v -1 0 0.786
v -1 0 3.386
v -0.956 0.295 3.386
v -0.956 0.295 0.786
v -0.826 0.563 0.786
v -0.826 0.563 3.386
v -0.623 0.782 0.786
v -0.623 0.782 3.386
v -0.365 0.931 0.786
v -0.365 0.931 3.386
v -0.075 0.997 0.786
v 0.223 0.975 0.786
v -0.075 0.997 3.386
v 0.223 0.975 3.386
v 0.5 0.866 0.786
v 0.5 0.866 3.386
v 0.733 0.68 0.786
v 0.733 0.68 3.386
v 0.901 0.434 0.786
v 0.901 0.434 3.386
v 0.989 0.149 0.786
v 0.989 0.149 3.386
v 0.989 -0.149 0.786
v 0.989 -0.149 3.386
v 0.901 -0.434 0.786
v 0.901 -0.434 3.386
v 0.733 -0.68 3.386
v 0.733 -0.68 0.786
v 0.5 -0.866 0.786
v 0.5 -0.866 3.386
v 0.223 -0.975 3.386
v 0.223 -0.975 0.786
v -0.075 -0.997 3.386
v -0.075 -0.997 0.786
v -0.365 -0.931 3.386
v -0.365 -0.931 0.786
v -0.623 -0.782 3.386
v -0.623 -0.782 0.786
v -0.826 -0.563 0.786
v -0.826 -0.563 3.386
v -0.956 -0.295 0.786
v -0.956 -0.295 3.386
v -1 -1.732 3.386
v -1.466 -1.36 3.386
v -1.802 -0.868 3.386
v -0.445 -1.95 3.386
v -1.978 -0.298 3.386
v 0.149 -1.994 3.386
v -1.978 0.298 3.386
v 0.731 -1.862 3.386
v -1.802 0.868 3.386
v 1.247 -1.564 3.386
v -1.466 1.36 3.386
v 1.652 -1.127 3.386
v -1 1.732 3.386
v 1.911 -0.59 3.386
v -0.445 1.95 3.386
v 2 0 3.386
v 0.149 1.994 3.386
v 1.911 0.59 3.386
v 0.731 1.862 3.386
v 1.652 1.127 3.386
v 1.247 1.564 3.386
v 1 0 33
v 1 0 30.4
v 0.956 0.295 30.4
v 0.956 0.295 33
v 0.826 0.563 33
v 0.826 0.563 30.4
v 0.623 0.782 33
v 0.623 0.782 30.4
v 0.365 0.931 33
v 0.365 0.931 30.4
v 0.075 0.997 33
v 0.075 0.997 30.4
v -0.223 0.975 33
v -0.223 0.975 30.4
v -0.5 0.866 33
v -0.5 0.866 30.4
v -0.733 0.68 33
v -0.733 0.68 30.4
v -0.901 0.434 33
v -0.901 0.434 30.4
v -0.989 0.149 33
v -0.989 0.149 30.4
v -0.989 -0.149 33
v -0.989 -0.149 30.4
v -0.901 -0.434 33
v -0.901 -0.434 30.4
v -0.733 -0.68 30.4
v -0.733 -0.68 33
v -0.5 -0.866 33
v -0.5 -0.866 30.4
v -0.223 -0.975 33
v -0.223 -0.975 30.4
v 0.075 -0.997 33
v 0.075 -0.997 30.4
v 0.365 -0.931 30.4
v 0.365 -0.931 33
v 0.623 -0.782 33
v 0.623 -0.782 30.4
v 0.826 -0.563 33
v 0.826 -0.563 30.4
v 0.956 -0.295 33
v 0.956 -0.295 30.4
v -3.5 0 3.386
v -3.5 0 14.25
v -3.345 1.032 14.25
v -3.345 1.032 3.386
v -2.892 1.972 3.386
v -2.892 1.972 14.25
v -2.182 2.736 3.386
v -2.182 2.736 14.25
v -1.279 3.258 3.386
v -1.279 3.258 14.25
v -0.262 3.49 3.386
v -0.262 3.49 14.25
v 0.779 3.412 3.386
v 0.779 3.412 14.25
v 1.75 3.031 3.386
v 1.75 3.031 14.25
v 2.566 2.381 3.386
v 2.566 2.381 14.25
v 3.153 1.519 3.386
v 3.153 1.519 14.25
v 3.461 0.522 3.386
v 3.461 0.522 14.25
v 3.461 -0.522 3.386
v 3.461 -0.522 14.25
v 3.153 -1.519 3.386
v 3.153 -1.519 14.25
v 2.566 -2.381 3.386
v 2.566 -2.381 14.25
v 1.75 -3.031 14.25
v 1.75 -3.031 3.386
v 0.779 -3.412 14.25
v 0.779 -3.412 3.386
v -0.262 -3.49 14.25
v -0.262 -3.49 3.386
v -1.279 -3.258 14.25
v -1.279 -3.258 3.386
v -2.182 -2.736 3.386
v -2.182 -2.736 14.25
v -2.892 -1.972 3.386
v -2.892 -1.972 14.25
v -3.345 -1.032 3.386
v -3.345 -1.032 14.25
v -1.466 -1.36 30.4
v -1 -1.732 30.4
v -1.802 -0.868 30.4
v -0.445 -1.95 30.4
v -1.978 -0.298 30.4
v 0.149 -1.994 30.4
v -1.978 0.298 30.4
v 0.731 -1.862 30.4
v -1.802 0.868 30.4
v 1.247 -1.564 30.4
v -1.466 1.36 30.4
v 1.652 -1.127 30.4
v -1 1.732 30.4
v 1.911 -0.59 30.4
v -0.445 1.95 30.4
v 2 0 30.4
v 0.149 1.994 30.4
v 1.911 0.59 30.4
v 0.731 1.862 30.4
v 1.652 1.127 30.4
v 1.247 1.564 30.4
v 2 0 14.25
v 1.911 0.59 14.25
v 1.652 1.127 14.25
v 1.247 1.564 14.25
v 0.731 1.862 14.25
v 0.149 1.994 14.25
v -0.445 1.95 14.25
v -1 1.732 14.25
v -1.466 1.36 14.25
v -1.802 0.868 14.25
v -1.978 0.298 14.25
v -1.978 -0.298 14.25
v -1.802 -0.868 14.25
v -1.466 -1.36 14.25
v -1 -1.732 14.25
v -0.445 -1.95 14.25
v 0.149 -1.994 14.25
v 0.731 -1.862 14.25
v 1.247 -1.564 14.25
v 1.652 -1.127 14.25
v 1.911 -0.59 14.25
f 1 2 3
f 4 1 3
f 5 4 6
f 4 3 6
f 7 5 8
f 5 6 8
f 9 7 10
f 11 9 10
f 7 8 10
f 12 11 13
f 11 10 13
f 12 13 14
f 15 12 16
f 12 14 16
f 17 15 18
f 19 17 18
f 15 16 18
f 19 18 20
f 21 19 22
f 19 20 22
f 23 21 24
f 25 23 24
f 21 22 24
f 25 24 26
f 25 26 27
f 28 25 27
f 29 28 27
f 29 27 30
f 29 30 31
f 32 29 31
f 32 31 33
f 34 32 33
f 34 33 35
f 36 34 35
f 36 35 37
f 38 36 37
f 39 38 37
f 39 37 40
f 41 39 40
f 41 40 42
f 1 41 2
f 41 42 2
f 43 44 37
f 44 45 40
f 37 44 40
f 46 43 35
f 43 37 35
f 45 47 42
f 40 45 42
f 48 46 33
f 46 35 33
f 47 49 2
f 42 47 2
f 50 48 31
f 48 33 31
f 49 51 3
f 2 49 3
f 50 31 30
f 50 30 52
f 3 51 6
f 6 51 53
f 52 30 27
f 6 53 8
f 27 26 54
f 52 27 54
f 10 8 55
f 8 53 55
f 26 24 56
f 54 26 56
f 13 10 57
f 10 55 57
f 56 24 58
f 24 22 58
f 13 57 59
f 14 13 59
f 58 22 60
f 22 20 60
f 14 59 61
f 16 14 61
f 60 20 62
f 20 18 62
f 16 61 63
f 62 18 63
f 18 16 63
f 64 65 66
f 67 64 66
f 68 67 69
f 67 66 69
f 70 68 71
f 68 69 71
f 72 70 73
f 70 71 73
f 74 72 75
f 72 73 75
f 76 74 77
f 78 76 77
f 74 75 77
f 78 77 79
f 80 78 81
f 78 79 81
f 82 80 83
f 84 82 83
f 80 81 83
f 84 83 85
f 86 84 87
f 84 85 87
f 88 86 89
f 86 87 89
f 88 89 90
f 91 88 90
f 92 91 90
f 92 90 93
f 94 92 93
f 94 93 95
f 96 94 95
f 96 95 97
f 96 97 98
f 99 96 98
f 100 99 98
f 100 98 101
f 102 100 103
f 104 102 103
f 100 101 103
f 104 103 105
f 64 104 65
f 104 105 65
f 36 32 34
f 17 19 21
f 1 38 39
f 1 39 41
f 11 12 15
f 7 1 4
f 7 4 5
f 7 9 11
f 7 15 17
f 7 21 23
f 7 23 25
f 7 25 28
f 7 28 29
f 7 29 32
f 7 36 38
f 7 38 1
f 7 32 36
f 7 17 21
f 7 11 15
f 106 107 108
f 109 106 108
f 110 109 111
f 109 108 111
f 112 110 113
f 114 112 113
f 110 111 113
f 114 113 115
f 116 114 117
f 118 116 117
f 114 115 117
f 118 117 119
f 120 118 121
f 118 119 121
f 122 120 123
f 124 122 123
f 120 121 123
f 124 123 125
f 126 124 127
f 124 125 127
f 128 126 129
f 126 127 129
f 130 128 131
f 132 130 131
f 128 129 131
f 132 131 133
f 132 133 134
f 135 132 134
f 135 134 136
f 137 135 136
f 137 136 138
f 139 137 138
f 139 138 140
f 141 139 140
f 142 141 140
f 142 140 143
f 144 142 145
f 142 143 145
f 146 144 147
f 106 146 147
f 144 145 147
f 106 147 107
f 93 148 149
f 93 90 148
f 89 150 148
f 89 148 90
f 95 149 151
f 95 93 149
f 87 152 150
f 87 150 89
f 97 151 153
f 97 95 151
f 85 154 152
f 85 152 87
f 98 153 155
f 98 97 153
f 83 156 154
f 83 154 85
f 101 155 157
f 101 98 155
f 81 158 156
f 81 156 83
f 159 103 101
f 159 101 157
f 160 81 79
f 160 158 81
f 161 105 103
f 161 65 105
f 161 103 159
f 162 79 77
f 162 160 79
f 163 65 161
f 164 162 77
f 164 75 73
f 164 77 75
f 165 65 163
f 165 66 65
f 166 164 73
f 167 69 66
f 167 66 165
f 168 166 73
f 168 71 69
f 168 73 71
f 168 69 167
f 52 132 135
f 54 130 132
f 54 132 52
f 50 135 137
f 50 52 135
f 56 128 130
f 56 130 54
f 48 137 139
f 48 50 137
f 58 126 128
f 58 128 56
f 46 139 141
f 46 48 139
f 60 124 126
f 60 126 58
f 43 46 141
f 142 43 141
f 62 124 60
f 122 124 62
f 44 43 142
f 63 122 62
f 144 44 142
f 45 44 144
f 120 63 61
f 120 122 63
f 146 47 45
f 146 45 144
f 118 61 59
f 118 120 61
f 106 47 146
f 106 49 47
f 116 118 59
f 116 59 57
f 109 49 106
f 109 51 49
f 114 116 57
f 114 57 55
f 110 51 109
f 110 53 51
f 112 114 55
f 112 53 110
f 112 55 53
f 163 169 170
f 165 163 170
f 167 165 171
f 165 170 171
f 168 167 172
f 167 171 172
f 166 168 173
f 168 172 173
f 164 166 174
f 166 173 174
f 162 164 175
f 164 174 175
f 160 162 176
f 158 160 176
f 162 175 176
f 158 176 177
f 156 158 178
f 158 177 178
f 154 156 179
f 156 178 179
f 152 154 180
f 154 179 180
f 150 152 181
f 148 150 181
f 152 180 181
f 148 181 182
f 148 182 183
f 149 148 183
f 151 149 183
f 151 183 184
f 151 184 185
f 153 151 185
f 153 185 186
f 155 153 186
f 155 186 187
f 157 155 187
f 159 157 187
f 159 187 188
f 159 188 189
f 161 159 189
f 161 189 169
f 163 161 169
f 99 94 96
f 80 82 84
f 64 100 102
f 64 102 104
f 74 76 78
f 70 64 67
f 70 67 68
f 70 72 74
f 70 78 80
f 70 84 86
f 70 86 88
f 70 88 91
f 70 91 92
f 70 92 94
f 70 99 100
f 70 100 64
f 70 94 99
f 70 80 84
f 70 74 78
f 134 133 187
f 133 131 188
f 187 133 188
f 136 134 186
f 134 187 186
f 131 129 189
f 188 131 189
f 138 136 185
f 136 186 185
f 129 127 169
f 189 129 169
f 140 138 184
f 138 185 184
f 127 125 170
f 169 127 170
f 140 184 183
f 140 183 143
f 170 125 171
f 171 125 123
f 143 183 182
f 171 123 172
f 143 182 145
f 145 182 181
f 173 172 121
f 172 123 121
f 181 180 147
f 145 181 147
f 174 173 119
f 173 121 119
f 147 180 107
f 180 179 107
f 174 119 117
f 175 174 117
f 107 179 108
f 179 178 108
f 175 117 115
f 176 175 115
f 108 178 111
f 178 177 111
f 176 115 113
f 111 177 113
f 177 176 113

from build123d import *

# Parameters (mm, degrees)
EXTRUDE_START   = 3.386462
SKETCH_1_R      = 2
EXTRUDE_1_DEPTH = 27.013538
SKETCH_2_R      = 1
EXTRUDE_2_DEPTH = 2.6
SKETCH_4_R      = 1
EXTRUDE_3_DEPTH = 2.6
EXTRUDE_START_2 = -10.863538
SKETCH_6_R      = 3.5
EXTRUDE_5_DEPTH = 10.863538


with BuildPart() as part:
    # Эскиз1 → Бобышка-Вытянуть1 (new body)
    with BuildSketch(Plane.XY.offset(EXTRUDE_START)):
        Circle(SKETCH_1_R)
    extrude(amount=EXTRUDE_1_DEPTH)

    # Эскиз2 → Бобышка-Вытянуть2 (add)
    with BuildSketch(Plane.XY.offset(30.4)):
        Circle(SKETCH_2_R)
    extrude(amount=EXTRUDE_2_DEPTH)

    # Эскиз4 → Бобышка-Вытянуть3 (add)
    with BuildSketch(Plane(origin=(0, 0, 3.386462289), x_dir=(-1, 0, 0), z_dir=(0, 0, -1))):
        Circle(SKETCH_4_R)
    extrude(amount=EXTRUDE_3_DEPTH)

    # Эскиз6 → Бобышка-Вытянуть5 (add)
    with BuildSketch(Plane(origin=(0, 0, 3.386462289), x_dir=(-1, 0, 0), z_dir=(0, 0, -1)).offset(EXTRUDE_START_2)):
        Circle(SKETCH_6_R)
    extrude(amount=EXTRUDE_5_DEPTH)


solid = part.part
